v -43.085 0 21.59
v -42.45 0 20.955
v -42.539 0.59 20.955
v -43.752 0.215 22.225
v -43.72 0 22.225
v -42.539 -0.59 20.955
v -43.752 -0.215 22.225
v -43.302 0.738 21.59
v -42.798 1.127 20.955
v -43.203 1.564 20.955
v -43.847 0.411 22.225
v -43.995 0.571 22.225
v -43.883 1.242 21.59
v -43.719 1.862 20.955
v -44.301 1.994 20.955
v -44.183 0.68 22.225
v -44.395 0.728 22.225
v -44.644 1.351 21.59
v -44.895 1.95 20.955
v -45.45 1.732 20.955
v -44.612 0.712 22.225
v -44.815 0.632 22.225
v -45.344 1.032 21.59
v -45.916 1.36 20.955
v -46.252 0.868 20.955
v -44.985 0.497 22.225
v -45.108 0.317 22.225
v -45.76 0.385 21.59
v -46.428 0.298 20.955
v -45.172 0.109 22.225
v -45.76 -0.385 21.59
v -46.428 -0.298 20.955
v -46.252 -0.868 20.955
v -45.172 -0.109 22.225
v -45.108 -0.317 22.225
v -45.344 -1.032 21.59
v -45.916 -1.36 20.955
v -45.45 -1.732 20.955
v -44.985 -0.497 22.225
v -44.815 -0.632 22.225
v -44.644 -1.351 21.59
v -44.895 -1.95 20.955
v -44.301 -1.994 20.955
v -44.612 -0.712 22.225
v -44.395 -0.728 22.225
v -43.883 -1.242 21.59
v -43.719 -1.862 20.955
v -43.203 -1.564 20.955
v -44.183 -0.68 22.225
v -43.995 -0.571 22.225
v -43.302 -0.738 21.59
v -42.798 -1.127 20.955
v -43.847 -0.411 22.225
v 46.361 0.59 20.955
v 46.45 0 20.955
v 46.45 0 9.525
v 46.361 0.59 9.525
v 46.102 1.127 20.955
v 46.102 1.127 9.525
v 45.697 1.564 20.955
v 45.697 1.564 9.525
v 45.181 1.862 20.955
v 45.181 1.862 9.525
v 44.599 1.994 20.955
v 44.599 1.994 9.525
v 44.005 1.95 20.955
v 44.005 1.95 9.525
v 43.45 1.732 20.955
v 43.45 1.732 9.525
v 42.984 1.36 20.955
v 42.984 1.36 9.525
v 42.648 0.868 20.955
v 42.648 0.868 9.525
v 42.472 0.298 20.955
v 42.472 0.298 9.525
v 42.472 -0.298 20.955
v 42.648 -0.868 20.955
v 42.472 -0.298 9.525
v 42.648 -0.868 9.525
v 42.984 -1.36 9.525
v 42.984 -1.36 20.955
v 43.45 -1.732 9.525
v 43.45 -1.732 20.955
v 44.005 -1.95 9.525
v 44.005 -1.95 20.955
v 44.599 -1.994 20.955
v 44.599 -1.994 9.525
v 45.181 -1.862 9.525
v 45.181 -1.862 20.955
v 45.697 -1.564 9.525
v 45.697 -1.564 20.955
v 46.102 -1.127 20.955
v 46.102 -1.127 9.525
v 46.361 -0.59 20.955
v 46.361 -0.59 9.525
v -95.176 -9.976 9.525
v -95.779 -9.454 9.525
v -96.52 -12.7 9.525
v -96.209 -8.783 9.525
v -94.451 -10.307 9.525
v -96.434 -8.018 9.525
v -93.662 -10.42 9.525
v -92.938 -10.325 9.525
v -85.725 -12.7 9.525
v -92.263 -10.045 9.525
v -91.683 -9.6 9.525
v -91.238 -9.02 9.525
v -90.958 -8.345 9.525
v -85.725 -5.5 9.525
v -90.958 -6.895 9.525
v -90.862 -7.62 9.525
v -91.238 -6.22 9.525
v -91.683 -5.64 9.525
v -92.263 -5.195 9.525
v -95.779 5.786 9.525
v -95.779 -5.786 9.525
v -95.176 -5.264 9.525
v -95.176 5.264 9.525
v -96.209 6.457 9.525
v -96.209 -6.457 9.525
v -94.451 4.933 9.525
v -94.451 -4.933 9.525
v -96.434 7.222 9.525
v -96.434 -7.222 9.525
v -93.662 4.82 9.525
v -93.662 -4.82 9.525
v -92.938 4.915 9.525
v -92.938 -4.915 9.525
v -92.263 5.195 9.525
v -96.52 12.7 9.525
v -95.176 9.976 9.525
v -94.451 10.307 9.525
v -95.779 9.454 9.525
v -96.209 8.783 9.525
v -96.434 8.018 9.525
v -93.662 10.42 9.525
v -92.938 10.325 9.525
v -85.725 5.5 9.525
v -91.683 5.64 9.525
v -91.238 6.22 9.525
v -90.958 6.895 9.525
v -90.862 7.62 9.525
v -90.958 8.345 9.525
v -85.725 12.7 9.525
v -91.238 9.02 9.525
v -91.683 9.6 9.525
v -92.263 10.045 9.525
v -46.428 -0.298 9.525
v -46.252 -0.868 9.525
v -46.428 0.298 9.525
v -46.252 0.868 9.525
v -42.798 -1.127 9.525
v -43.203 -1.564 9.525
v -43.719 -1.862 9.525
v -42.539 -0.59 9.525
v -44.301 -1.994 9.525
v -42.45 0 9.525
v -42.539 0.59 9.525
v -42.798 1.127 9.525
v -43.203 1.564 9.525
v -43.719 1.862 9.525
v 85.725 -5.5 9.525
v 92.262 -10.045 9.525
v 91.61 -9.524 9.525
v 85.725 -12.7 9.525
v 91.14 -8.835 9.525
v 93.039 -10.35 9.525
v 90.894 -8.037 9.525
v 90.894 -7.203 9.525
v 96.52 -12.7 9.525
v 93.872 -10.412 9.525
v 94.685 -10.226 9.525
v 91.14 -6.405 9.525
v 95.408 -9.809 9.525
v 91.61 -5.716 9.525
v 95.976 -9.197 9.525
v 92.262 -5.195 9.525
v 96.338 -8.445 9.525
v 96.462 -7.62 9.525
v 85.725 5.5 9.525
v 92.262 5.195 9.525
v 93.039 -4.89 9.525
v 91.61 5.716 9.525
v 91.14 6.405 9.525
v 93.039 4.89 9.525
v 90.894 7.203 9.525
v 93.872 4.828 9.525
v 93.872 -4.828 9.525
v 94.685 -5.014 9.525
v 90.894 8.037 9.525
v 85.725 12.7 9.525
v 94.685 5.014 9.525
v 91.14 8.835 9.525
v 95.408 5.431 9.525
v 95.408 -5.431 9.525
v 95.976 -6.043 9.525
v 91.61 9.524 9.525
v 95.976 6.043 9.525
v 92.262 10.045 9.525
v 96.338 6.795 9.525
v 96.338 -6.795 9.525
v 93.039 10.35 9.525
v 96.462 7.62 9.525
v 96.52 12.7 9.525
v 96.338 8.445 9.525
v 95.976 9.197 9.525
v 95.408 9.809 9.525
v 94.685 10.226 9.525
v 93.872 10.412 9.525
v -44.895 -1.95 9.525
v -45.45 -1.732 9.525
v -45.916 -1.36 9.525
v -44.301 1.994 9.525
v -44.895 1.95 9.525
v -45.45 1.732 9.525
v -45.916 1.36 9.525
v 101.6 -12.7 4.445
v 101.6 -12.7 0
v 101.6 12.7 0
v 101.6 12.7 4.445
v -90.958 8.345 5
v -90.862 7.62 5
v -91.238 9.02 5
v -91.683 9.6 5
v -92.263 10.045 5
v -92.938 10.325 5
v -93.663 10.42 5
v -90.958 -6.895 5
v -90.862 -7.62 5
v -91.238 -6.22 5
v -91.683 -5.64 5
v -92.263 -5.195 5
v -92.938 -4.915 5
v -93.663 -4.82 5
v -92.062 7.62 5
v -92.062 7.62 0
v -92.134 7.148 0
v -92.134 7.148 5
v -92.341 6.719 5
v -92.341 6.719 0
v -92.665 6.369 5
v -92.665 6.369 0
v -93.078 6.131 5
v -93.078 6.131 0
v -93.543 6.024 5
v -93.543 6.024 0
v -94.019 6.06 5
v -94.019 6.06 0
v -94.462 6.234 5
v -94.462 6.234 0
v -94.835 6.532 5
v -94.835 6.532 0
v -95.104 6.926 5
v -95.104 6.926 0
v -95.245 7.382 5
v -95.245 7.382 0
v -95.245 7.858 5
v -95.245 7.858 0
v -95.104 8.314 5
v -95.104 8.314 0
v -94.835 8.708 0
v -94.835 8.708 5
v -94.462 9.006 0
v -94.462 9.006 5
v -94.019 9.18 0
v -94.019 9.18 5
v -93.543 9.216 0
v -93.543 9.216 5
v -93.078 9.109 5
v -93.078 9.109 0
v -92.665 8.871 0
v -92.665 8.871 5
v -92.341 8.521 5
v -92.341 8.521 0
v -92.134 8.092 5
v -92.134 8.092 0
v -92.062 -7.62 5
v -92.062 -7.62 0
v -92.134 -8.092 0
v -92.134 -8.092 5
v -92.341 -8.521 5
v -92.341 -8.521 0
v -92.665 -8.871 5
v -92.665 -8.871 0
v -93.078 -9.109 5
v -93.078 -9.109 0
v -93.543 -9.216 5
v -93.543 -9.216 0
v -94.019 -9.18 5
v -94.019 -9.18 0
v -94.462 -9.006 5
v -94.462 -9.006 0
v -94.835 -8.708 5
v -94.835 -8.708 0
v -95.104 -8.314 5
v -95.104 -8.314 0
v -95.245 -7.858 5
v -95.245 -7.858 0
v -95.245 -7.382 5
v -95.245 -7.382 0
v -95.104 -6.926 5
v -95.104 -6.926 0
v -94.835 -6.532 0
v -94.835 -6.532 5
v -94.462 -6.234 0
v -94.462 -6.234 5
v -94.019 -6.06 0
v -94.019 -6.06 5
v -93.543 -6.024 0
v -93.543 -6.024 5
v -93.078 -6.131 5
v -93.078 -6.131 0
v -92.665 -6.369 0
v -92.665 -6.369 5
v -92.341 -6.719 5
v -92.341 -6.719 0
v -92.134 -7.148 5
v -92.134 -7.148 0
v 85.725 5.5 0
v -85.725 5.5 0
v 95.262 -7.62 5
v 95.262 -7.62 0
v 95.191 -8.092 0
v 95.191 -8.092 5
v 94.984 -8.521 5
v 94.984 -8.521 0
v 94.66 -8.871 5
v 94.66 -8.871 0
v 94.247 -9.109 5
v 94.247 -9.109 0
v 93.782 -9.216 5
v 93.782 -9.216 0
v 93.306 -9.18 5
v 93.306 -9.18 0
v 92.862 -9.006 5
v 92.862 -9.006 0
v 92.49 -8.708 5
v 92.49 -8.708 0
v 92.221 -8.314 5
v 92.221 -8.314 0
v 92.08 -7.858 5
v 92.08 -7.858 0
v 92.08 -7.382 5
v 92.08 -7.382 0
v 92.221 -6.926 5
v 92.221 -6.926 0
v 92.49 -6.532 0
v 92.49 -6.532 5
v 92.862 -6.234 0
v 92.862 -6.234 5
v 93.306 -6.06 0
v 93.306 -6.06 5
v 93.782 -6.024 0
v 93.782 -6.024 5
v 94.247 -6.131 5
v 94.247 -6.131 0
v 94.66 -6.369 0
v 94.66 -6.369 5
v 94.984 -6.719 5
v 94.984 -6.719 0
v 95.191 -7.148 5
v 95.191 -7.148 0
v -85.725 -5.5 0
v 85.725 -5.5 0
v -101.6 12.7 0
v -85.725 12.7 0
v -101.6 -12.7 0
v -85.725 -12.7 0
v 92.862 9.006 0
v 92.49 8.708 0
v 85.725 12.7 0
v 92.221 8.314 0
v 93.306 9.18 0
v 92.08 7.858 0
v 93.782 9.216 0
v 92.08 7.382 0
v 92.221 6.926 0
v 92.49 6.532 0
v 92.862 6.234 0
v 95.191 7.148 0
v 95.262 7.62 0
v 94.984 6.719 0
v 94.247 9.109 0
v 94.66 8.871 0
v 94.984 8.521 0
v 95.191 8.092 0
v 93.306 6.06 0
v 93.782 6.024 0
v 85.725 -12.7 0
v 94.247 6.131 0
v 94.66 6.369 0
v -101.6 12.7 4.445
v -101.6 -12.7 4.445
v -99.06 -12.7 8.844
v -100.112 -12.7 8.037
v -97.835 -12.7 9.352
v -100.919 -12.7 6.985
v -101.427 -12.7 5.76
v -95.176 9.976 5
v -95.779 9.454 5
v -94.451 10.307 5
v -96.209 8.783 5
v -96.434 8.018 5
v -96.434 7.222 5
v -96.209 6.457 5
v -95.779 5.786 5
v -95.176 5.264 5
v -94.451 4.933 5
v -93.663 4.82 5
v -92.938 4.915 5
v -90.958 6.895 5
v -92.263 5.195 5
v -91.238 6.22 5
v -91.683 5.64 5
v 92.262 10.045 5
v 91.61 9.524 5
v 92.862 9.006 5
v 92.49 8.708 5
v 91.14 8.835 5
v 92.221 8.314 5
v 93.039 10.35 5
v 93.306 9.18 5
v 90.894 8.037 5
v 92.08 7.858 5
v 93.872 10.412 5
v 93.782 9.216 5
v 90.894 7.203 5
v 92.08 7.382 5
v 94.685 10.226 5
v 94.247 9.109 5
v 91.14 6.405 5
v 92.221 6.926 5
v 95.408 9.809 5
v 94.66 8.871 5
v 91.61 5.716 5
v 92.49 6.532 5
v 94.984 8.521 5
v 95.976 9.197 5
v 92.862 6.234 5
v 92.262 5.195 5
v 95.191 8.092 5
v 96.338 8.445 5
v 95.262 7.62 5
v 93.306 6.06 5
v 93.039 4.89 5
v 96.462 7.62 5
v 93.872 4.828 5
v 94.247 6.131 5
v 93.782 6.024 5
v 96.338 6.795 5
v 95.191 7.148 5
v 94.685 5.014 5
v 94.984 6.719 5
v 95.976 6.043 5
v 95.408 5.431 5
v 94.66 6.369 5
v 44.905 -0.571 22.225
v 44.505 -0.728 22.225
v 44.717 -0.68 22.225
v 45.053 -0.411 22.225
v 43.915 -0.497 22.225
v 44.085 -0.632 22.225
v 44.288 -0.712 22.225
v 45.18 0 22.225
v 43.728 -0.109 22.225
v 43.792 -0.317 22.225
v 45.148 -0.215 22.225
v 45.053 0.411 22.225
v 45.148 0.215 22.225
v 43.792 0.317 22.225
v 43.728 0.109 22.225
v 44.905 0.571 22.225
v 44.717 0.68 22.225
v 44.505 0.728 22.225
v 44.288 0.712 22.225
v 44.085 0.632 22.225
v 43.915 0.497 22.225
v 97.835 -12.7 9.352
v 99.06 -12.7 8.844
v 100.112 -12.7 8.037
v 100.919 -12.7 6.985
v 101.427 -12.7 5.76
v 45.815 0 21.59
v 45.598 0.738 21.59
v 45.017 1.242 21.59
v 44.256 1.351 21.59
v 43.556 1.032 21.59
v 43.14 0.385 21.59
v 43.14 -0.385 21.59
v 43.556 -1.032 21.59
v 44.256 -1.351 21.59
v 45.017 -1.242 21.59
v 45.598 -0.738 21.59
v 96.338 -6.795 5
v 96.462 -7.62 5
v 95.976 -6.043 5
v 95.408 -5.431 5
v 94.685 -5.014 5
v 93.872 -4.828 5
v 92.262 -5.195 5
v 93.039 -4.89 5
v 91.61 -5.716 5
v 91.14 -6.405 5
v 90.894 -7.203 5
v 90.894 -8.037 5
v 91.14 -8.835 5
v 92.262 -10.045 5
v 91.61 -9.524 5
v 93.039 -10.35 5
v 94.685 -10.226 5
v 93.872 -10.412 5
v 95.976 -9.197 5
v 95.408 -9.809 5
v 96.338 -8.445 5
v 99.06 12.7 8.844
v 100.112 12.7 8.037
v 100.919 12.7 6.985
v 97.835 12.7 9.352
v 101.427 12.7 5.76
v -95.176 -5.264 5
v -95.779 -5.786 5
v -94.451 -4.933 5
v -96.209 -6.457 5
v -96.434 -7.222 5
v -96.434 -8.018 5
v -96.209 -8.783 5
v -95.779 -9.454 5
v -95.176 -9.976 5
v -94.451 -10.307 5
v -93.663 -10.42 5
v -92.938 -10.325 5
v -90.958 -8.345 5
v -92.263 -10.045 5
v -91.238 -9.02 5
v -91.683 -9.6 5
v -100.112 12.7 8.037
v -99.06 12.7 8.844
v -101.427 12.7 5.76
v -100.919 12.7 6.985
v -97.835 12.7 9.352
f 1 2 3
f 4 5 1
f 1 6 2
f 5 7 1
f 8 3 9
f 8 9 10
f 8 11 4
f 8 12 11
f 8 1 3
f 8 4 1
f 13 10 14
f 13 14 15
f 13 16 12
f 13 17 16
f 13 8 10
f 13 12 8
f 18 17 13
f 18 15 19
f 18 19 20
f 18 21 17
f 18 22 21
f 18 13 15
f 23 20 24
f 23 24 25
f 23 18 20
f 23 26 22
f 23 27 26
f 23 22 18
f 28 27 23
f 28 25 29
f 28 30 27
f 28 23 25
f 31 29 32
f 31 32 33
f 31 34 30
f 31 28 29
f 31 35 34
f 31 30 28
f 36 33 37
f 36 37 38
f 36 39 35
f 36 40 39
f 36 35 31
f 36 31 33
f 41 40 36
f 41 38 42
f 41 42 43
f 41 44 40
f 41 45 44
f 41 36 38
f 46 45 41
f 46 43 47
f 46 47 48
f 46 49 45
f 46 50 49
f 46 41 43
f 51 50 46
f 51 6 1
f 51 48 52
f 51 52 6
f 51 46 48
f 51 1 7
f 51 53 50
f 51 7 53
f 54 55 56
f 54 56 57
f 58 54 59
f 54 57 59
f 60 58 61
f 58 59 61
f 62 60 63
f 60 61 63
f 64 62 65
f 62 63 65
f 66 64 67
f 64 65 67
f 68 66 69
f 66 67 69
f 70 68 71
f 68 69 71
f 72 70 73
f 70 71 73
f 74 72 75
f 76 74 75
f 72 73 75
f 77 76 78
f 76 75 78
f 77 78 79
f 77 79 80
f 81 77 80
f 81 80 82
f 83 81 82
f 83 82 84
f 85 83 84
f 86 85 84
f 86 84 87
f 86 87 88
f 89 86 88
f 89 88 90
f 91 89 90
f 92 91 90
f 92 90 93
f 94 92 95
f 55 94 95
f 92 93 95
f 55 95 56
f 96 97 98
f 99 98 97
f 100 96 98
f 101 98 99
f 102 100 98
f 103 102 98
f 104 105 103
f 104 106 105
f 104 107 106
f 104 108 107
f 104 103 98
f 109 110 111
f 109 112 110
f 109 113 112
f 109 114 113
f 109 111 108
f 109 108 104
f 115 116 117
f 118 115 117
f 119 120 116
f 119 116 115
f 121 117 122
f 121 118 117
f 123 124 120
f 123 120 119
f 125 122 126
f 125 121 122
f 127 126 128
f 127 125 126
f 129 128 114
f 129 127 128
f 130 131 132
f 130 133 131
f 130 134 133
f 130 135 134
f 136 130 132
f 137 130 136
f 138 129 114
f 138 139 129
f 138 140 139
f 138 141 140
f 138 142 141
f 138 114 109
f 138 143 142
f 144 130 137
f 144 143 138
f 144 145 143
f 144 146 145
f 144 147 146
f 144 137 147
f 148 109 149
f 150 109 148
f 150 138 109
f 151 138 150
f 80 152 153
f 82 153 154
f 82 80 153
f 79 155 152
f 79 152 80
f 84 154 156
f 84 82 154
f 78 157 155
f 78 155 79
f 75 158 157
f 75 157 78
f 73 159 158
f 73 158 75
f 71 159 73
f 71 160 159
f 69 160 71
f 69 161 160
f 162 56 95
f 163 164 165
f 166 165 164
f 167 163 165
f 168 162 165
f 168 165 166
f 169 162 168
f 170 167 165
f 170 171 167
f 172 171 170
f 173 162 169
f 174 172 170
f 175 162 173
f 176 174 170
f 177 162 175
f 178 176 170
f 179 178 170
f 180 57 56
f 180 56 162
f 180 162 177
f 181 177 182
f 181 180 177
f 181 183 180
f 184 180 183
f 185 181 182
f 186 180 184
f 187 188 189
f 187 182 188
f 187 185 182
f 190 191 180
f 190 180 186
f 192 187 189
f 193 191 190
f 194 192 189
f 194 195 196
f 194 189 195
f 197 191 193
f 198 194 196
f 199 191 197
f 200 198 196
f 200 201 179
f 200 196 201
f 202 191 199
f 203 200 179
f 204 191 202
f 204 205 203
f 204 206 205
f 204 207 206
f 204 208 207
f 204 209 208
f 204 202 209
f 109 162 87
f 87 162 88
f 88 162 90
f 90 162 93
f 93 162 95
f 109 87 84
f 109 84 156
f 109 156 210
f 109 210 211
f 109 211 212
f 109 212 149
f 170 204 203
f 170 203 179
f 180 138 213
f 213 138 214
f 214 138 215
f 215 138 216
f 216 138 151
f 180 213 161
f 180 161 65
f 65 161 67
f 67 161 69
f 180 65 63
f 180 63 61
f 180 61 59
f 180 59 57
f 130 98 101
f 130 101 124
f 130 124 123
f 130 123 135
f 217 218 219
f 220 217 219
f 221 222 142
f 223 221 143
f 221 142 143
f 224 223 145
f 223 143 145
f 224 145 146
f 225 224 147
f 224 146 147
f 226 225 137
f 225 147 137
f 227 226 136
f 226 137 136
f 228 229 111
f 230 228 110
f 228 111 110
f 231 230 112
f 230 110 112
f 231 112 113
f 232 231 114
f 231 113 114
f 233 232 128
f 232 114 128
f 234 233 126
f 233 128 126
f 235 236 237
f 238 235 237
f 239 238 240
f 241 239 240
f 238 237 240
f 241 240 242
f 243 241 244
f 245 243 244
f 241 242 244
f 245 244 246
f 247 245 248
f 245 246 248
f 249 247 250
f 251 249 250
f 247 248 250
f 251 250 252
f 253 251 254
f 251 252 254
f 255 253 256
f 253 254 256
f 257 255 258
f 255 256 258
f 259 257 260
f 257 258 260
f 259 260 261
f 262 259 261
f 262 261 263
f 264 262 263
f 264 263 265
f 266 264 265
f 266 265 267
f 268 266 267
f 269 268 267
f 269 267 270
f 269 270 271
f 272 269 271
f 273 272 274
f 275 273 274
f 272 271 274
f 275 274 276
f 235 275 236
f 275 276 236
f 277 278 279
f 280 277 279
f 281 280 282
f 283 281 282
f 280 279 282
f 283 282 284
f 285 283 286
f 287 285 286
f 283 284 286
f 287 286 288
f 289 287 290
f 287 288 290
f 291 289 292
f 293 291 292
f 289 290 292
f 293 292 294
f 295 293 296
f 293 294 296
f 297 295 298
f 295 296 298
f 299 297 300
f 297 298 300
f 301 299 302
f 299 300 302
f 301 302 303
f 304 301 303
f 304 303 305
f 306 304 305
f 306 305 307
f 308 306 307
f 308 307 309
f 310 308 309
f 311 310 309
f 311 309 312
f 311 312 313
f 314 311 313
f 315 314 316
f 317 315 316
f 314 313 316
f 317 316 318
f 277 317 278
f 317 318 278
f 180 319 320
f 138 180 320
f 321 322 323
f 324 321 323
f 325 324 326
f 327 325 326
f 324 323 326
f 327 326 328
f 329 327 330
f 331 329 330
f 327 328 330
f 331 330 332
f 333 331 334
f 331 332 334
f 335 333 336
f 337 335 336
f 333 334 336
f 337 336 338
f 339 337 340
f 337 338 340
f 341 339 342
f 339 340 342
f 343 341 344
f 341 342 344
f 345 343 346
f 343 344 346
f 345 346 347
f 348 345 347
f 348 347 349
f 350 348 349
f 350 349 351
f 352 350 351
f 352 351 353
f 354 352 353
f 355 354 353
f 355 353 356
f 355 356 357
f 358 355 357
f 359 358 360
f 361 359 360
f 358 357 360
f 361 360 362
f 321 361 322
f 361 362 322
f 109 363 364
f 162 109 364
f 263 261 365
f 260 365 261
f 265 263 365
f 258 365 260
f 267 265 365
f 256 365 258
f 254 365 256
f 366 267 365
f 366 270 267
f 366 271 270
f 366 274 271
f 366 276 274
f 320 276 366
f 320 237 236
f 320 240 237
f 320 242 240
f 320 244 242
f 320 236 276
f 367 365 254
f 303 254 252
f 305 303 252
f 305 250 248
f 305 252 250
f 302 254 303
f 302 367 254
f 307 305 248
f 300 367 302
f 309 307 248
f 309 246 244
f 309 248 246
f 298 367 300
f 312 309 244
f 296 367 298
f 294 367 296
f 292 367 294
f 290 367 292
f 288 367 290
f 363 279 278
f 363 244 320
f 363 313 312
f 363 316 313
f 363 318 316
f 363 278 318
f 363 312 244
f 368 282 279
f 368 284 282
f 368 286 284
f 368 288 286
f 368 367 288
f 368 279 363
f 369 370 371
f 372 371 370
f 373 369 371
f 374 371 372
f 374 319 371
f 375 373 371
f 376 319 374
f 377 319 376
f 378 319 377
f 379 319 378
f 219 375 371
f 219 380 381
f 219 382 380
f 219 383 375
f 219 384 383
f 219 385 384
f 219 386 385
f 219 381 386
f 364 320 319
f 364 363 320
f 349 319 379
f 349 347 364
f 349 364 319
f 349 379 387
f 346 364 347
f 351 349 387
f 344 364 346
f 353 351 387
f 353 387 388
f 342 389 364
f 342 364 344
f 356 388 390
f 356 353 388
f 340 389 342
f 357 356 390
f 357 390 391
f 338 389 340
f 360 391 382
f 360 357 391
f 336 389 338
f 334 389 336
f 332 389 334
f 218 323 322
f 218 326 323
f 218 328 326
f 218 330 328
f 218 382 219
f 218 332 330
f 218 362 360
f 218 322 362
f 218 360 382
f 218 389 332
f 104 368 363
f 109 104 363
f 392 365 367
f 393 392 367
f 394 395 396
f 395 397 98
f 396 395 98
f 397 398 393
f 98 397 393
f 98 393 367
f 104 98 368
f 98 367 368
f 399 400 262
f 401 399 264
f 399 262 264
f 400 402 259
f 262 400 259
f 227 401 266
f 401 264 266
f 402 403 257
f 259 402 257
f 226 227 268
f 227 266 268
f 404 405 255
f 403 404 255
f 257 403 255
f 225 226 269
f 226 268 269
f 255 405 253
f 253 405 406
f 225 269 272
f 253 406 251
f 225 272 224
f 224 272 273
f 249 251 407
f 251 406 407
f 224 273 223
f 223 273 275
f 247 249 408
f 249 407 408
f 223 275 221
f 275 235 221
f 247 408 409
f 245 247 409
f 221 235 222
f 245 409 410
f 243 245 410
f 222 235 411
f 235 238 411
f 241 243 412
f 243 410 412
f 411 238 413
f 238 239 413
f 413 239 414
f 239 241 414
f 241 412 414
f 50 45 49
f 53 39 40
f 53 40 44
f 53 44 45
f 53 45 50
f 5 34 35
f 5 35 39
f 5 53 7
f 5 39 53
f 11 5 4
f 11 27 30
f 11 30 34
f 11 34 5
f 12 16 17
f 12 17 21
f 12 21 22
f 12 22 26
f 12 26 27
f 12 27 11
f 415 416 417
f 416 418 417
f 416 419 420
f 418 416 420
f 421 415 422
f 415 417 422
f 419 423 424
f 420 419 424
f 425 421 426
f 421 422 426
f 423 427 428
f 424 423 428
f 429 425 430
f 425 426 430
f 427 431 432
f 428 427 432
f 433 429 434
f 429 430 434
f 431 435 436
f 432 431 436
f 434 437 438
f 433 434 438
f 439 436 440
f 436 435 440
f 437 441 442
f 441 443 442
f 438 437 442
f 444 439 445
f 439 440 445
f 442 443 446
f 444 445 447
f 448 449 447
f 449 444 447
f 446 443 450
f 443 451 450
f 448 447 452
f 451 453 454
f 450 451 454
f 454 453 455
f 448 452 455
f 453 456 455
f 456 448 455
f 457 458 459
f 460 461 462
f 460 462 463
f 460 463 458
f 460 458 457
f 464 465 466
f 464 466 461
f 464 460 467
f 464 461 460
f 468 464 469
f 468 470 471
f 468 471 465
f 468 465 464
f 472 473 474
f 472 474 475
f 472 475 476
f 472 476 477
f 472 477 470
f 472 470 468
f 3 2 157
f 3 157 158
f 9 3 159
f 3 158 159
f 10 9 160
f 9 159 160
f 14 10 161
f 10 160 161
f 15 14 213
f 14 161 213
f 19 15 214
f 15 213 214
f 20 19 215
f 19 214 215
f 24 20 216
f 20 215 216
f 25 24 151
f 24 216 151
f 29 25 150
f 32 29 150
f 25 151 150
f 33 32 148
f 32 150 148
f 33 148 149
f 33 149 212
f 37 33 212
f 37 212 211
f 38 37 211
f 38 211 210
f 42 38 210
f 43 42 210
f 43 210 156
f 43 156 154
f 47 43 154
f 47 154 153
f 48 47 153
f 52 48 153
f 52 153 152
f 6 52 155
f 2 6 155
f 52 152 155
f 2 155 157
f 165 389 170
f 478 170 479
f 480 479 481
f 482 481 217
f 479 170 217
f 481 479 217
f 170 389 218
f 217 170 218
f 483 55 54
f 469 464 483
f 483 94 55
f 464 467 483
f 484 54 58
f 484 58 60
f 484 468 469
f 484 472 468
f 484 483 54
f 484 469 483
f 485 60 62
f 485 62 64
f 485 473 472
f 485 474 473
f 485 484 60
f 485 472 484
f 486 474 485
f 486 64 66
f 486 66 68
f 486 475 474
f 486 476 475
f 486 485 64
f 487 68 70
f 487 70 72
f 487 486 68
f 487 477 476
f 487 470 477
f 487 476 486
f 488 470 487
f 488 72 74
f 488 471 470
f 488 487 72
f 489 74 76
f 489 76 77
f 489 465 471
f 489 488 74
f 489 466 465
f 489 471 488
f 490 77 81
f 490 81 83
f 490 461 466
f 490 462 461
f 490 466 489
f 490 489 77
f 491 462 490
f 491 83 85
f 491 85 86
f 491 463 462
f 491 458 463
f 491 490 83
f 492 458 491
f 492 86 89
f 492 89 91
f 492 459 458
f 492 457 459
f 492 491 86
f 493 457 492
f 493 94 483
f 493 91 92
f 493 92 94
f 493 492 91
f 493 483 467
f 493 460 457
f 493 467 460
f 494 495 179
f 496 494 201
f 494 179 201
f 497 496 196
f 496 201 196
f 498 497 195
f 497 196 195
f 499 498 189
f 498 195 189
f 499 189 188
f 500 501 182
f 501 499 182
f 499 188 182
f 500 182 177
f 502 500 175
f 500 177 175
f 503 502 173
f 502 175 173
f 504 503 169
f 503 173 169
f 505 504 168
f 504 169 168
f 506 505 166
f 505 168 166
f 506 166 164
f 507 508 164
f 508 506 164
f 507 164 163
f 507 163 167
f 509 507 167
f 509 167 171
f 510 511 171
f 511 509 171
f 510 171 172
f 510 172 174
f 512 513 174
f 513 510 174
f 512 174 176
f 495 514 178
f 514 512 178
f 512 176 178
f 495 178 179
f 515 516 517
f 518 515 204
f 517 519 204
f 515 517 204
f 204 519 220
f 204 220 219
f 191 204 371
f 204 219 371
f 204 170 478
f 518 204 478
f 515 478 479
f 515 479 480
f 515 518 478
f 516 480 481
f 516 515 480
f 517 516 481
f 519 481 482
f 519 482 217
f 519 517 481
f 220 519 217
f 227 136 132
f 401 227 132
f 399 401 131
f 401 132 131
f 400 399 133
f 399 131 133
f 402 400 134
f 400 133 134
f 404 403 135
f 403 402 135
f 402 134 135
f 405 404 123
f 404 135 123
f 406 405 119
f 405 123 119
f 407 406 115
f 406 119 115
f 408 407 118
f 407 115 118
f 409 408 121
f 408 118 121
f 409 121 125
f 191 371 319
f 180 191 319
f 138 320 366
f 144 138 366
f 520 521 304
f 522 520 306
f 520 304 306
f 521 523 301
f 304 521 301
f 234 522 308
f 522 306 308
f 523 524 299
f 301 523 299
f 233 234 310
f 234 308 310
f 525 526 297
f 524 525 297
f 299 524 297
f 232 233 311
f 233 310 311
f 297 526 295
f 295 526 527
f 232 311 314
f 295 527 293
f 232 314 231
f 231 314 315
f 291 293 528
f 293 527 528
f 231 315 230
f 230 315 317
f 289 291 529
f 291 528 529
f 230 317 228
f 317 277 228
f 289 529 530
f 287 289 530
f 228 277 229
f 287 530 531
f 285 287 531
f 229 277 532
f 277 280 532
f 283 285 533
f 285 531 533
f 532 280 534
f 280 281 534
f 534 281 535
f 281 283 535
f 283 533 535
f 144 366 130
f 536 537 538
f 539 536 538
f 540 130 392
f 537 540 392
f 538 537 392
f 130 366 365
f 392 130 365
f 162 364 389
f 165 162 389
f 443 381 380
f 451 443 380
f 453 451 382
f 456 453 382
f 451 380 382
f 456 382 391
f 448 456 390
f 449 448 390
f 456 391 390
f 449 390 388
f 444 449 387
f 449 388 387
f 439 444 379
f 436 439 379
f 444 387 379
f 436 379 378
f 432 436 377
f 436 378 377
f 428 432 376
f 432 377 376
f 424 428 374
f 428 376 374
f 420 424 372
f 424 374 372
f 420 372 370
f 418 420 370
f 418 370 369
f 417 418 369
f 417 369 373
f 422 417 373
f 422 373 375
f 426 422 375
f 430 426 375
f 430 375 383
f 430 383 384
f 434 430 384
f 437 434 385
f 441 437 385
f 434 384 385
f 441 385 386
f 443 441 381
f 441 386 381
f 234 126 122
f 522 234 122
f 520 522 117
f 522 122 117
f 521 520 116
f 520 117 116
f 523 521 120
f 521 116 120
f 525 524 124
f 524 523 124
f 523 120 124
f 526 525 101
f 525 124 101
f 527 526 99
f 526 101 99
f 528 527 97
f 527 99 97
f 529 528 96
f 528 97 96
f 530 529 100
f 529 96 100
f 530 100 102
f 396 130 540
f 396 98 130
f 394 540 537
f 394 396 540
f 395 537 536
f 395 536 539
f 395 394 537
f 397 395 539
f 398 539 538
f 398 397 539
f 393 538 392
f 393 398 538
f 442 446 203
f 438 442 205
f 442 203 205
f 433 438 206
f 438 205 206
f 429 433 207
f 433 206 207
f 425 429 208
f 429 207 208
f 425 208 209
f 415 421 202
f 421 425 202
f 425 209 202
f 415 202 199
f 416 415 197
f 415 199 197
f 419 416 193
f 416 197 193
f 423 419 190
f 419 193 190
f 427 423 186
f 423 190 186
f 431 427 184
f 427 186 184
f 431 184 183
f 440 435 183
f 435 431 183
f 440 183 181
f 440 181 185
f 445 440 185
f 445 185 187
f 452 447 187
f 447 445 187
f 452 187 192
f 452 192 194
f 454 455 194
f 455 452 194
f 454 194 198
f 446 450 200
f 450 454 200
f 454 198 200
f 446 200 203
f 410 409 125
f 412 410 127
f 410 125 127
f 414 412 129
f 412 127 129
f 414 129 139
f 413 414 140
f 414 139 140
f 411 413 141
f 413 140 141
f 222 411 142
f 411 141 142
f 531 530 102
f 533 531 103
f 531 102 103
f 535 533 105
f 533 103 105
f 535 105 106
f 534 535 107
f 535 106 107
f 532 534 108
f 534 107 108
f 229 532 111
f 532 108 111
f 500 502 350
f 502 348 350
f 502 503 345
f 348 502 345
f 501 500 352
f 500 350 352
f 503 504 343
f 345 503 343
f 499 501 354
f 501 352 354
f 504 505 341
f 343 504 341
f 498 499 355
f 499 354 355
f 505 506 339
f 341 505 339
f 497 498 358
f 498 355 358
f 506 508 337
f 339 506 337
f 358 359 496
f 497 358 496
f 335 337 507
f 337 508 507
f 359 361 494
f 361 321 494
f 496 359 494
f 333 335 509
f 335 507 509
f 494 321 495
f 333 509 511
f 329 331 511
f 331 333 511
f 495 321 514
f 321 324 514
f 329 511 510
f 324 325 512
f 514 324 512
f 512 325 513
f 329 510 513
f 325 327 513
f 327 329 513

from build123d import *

# Parameters (mm, degrees)
F1_DEPTH = 9.525
F2_R     = 2.8
F3_DEPTH = 9.525
F4_R     = 2
F5_DEPTH = 12.7
F6_SIZE  = 1.27
F7_R     = 5.08
F8_R     = 2.8
F8_R_2   = 1.6
F9_DEPTH = 5


# Not quite as in the source:
# - a length typed as a fraction of an inch, garbled in the dataset ("3 / 203.2 mm" for 3/8 in), is restored


with BuildPart() as f1:
    # F0 (on Top) → F1 (new body)
    with BuildSketch(Plane.XY):
        Polygon((-85.725, -5.5000017), (85.725, -5.5000017), (85.725, -12.7), (101.6, -12.7), (101.6, -5.5000017), (101.6, 5.5000017), (101.6, 12.7), (85.725, 12.7), (85.725, 5.5000017), (-85.725, 5.5000017), (-85.725, 12.7), (-101.6, 12.7), (-101.6, 5.5000017), (-101.6, -5.5000017), (-101.6, -12.7), (-85.725, -12.7), align=None)
    extrude(amount=F1_DEPTH)

    # F2 (on face) → F3 (cut, through all)
    with BuildSketch(Plane.XY.offset(9.525)):
        with BuildLine():
            ThreePointArc((-93.6625, 4.82), (-91.6826010127, 5.6401010127), (-90.8625, 7.62))
            ThreePointArc((-90.8625, 7.62), (-91.6826010127, 9.5998989873), (-93.6625, 10.42))
            Line((-93.6625, 10.42), (-93.6625, 4.82))
        make_face()
        with BuildLine():
            ThreePointArc((-90.8625, -7.62), (-91.6826010127, -5.6401010127), (-93.6625, -4.82))
            Line((-93.6625, -4.82), (-93.6625, -10.42))
            ThreePointArc((-93.6625, -10.42), (-91.6826010127, -9.5998989873), (-90.8625, -7.62))
        make_face()
        with BuildLine():
            Line((-93.6625, -10.42), (-93.6625, -4.82))
            ThreePointArc((-93.6625, -4.82), (-96.4625, -7.62), (-93.6625, -10.42))
        make_face()
        with BuildLine():
            Line((-93.6625, 4.82), (-93.6625, 10.42))
            ThreePointArc((-93.6625, 10.42), (-96.4625, 7.62), (-93.6625, 4.82))
        make_face()
        with Locations((93.6625, 7.62)):
            Circle(F2_R)
        with Locations((93.6625, -7.62)):
            Circle(F2_R)
    extrude(amount=-F3_DEPTH, mode=Mode.SUBTRACT)

    # F4 (on face) → F5 (join)
    with BuildSketch(Plane.XY.offset(9.525)):
        with Locations((-44.45, 0)):
            Circle(F4_R)
        with Locations((44.45, 0)):
            Circle(F4_R)
    extrude(amount=F5_DEPTH)

    # F6
    f6_edges = [f1.edges().sort_by_distance(p)[0] for p in [
        (-46.45, 0, 22.225),
        (42.45, 0, 22.225),
    ]]
    chamfer(f6_edges, length=F6_SIZE)

    # F7
    f7_edges = [f1.edges().sort_by_distance(p)[0] for p in [
        (-101.6, 0, 9.525),
        (101.6, 0, 9.525),
    ]]
    fillet(f7_edges, radius=F7_R)

    # F8 (on face) → F9 (join)
    with BuildSketch(Plane(origin=(0, 0, 0), x_dir=(1, 0, 0), z_dir=(0, 0, -1))):
        with Locations((93.6625, 7.62)):
            Circle(F8_R)
        with Locations((93.6625, 7.62)):
            Circle(F8_R_2, mode=Mode.SUBTRACT)
        with Locations((93.6625, -7.62)):
            Circle(F8_R)
        with Locations((93.6625, -7.62)):
            Circle(F8_R_2, mode=Mode.SUBTRACT)
        with Locations((-93.6625, 7.62)):
            Circle(F8_R)
        with Locations((-93.6625, 7.62)):
            Circle(F8_R_2, mode=Mode.SUBTRACT)
        with Locations((-93.6625, -7.62)):
            Circle(F8_R)
        with Locations((-93.6625, -7.62)):
            Circle(F8_R_2, mode=Mode.SUBTRACT)
    extrude(amount=-F9_DEPTH)


solid = f1.part
